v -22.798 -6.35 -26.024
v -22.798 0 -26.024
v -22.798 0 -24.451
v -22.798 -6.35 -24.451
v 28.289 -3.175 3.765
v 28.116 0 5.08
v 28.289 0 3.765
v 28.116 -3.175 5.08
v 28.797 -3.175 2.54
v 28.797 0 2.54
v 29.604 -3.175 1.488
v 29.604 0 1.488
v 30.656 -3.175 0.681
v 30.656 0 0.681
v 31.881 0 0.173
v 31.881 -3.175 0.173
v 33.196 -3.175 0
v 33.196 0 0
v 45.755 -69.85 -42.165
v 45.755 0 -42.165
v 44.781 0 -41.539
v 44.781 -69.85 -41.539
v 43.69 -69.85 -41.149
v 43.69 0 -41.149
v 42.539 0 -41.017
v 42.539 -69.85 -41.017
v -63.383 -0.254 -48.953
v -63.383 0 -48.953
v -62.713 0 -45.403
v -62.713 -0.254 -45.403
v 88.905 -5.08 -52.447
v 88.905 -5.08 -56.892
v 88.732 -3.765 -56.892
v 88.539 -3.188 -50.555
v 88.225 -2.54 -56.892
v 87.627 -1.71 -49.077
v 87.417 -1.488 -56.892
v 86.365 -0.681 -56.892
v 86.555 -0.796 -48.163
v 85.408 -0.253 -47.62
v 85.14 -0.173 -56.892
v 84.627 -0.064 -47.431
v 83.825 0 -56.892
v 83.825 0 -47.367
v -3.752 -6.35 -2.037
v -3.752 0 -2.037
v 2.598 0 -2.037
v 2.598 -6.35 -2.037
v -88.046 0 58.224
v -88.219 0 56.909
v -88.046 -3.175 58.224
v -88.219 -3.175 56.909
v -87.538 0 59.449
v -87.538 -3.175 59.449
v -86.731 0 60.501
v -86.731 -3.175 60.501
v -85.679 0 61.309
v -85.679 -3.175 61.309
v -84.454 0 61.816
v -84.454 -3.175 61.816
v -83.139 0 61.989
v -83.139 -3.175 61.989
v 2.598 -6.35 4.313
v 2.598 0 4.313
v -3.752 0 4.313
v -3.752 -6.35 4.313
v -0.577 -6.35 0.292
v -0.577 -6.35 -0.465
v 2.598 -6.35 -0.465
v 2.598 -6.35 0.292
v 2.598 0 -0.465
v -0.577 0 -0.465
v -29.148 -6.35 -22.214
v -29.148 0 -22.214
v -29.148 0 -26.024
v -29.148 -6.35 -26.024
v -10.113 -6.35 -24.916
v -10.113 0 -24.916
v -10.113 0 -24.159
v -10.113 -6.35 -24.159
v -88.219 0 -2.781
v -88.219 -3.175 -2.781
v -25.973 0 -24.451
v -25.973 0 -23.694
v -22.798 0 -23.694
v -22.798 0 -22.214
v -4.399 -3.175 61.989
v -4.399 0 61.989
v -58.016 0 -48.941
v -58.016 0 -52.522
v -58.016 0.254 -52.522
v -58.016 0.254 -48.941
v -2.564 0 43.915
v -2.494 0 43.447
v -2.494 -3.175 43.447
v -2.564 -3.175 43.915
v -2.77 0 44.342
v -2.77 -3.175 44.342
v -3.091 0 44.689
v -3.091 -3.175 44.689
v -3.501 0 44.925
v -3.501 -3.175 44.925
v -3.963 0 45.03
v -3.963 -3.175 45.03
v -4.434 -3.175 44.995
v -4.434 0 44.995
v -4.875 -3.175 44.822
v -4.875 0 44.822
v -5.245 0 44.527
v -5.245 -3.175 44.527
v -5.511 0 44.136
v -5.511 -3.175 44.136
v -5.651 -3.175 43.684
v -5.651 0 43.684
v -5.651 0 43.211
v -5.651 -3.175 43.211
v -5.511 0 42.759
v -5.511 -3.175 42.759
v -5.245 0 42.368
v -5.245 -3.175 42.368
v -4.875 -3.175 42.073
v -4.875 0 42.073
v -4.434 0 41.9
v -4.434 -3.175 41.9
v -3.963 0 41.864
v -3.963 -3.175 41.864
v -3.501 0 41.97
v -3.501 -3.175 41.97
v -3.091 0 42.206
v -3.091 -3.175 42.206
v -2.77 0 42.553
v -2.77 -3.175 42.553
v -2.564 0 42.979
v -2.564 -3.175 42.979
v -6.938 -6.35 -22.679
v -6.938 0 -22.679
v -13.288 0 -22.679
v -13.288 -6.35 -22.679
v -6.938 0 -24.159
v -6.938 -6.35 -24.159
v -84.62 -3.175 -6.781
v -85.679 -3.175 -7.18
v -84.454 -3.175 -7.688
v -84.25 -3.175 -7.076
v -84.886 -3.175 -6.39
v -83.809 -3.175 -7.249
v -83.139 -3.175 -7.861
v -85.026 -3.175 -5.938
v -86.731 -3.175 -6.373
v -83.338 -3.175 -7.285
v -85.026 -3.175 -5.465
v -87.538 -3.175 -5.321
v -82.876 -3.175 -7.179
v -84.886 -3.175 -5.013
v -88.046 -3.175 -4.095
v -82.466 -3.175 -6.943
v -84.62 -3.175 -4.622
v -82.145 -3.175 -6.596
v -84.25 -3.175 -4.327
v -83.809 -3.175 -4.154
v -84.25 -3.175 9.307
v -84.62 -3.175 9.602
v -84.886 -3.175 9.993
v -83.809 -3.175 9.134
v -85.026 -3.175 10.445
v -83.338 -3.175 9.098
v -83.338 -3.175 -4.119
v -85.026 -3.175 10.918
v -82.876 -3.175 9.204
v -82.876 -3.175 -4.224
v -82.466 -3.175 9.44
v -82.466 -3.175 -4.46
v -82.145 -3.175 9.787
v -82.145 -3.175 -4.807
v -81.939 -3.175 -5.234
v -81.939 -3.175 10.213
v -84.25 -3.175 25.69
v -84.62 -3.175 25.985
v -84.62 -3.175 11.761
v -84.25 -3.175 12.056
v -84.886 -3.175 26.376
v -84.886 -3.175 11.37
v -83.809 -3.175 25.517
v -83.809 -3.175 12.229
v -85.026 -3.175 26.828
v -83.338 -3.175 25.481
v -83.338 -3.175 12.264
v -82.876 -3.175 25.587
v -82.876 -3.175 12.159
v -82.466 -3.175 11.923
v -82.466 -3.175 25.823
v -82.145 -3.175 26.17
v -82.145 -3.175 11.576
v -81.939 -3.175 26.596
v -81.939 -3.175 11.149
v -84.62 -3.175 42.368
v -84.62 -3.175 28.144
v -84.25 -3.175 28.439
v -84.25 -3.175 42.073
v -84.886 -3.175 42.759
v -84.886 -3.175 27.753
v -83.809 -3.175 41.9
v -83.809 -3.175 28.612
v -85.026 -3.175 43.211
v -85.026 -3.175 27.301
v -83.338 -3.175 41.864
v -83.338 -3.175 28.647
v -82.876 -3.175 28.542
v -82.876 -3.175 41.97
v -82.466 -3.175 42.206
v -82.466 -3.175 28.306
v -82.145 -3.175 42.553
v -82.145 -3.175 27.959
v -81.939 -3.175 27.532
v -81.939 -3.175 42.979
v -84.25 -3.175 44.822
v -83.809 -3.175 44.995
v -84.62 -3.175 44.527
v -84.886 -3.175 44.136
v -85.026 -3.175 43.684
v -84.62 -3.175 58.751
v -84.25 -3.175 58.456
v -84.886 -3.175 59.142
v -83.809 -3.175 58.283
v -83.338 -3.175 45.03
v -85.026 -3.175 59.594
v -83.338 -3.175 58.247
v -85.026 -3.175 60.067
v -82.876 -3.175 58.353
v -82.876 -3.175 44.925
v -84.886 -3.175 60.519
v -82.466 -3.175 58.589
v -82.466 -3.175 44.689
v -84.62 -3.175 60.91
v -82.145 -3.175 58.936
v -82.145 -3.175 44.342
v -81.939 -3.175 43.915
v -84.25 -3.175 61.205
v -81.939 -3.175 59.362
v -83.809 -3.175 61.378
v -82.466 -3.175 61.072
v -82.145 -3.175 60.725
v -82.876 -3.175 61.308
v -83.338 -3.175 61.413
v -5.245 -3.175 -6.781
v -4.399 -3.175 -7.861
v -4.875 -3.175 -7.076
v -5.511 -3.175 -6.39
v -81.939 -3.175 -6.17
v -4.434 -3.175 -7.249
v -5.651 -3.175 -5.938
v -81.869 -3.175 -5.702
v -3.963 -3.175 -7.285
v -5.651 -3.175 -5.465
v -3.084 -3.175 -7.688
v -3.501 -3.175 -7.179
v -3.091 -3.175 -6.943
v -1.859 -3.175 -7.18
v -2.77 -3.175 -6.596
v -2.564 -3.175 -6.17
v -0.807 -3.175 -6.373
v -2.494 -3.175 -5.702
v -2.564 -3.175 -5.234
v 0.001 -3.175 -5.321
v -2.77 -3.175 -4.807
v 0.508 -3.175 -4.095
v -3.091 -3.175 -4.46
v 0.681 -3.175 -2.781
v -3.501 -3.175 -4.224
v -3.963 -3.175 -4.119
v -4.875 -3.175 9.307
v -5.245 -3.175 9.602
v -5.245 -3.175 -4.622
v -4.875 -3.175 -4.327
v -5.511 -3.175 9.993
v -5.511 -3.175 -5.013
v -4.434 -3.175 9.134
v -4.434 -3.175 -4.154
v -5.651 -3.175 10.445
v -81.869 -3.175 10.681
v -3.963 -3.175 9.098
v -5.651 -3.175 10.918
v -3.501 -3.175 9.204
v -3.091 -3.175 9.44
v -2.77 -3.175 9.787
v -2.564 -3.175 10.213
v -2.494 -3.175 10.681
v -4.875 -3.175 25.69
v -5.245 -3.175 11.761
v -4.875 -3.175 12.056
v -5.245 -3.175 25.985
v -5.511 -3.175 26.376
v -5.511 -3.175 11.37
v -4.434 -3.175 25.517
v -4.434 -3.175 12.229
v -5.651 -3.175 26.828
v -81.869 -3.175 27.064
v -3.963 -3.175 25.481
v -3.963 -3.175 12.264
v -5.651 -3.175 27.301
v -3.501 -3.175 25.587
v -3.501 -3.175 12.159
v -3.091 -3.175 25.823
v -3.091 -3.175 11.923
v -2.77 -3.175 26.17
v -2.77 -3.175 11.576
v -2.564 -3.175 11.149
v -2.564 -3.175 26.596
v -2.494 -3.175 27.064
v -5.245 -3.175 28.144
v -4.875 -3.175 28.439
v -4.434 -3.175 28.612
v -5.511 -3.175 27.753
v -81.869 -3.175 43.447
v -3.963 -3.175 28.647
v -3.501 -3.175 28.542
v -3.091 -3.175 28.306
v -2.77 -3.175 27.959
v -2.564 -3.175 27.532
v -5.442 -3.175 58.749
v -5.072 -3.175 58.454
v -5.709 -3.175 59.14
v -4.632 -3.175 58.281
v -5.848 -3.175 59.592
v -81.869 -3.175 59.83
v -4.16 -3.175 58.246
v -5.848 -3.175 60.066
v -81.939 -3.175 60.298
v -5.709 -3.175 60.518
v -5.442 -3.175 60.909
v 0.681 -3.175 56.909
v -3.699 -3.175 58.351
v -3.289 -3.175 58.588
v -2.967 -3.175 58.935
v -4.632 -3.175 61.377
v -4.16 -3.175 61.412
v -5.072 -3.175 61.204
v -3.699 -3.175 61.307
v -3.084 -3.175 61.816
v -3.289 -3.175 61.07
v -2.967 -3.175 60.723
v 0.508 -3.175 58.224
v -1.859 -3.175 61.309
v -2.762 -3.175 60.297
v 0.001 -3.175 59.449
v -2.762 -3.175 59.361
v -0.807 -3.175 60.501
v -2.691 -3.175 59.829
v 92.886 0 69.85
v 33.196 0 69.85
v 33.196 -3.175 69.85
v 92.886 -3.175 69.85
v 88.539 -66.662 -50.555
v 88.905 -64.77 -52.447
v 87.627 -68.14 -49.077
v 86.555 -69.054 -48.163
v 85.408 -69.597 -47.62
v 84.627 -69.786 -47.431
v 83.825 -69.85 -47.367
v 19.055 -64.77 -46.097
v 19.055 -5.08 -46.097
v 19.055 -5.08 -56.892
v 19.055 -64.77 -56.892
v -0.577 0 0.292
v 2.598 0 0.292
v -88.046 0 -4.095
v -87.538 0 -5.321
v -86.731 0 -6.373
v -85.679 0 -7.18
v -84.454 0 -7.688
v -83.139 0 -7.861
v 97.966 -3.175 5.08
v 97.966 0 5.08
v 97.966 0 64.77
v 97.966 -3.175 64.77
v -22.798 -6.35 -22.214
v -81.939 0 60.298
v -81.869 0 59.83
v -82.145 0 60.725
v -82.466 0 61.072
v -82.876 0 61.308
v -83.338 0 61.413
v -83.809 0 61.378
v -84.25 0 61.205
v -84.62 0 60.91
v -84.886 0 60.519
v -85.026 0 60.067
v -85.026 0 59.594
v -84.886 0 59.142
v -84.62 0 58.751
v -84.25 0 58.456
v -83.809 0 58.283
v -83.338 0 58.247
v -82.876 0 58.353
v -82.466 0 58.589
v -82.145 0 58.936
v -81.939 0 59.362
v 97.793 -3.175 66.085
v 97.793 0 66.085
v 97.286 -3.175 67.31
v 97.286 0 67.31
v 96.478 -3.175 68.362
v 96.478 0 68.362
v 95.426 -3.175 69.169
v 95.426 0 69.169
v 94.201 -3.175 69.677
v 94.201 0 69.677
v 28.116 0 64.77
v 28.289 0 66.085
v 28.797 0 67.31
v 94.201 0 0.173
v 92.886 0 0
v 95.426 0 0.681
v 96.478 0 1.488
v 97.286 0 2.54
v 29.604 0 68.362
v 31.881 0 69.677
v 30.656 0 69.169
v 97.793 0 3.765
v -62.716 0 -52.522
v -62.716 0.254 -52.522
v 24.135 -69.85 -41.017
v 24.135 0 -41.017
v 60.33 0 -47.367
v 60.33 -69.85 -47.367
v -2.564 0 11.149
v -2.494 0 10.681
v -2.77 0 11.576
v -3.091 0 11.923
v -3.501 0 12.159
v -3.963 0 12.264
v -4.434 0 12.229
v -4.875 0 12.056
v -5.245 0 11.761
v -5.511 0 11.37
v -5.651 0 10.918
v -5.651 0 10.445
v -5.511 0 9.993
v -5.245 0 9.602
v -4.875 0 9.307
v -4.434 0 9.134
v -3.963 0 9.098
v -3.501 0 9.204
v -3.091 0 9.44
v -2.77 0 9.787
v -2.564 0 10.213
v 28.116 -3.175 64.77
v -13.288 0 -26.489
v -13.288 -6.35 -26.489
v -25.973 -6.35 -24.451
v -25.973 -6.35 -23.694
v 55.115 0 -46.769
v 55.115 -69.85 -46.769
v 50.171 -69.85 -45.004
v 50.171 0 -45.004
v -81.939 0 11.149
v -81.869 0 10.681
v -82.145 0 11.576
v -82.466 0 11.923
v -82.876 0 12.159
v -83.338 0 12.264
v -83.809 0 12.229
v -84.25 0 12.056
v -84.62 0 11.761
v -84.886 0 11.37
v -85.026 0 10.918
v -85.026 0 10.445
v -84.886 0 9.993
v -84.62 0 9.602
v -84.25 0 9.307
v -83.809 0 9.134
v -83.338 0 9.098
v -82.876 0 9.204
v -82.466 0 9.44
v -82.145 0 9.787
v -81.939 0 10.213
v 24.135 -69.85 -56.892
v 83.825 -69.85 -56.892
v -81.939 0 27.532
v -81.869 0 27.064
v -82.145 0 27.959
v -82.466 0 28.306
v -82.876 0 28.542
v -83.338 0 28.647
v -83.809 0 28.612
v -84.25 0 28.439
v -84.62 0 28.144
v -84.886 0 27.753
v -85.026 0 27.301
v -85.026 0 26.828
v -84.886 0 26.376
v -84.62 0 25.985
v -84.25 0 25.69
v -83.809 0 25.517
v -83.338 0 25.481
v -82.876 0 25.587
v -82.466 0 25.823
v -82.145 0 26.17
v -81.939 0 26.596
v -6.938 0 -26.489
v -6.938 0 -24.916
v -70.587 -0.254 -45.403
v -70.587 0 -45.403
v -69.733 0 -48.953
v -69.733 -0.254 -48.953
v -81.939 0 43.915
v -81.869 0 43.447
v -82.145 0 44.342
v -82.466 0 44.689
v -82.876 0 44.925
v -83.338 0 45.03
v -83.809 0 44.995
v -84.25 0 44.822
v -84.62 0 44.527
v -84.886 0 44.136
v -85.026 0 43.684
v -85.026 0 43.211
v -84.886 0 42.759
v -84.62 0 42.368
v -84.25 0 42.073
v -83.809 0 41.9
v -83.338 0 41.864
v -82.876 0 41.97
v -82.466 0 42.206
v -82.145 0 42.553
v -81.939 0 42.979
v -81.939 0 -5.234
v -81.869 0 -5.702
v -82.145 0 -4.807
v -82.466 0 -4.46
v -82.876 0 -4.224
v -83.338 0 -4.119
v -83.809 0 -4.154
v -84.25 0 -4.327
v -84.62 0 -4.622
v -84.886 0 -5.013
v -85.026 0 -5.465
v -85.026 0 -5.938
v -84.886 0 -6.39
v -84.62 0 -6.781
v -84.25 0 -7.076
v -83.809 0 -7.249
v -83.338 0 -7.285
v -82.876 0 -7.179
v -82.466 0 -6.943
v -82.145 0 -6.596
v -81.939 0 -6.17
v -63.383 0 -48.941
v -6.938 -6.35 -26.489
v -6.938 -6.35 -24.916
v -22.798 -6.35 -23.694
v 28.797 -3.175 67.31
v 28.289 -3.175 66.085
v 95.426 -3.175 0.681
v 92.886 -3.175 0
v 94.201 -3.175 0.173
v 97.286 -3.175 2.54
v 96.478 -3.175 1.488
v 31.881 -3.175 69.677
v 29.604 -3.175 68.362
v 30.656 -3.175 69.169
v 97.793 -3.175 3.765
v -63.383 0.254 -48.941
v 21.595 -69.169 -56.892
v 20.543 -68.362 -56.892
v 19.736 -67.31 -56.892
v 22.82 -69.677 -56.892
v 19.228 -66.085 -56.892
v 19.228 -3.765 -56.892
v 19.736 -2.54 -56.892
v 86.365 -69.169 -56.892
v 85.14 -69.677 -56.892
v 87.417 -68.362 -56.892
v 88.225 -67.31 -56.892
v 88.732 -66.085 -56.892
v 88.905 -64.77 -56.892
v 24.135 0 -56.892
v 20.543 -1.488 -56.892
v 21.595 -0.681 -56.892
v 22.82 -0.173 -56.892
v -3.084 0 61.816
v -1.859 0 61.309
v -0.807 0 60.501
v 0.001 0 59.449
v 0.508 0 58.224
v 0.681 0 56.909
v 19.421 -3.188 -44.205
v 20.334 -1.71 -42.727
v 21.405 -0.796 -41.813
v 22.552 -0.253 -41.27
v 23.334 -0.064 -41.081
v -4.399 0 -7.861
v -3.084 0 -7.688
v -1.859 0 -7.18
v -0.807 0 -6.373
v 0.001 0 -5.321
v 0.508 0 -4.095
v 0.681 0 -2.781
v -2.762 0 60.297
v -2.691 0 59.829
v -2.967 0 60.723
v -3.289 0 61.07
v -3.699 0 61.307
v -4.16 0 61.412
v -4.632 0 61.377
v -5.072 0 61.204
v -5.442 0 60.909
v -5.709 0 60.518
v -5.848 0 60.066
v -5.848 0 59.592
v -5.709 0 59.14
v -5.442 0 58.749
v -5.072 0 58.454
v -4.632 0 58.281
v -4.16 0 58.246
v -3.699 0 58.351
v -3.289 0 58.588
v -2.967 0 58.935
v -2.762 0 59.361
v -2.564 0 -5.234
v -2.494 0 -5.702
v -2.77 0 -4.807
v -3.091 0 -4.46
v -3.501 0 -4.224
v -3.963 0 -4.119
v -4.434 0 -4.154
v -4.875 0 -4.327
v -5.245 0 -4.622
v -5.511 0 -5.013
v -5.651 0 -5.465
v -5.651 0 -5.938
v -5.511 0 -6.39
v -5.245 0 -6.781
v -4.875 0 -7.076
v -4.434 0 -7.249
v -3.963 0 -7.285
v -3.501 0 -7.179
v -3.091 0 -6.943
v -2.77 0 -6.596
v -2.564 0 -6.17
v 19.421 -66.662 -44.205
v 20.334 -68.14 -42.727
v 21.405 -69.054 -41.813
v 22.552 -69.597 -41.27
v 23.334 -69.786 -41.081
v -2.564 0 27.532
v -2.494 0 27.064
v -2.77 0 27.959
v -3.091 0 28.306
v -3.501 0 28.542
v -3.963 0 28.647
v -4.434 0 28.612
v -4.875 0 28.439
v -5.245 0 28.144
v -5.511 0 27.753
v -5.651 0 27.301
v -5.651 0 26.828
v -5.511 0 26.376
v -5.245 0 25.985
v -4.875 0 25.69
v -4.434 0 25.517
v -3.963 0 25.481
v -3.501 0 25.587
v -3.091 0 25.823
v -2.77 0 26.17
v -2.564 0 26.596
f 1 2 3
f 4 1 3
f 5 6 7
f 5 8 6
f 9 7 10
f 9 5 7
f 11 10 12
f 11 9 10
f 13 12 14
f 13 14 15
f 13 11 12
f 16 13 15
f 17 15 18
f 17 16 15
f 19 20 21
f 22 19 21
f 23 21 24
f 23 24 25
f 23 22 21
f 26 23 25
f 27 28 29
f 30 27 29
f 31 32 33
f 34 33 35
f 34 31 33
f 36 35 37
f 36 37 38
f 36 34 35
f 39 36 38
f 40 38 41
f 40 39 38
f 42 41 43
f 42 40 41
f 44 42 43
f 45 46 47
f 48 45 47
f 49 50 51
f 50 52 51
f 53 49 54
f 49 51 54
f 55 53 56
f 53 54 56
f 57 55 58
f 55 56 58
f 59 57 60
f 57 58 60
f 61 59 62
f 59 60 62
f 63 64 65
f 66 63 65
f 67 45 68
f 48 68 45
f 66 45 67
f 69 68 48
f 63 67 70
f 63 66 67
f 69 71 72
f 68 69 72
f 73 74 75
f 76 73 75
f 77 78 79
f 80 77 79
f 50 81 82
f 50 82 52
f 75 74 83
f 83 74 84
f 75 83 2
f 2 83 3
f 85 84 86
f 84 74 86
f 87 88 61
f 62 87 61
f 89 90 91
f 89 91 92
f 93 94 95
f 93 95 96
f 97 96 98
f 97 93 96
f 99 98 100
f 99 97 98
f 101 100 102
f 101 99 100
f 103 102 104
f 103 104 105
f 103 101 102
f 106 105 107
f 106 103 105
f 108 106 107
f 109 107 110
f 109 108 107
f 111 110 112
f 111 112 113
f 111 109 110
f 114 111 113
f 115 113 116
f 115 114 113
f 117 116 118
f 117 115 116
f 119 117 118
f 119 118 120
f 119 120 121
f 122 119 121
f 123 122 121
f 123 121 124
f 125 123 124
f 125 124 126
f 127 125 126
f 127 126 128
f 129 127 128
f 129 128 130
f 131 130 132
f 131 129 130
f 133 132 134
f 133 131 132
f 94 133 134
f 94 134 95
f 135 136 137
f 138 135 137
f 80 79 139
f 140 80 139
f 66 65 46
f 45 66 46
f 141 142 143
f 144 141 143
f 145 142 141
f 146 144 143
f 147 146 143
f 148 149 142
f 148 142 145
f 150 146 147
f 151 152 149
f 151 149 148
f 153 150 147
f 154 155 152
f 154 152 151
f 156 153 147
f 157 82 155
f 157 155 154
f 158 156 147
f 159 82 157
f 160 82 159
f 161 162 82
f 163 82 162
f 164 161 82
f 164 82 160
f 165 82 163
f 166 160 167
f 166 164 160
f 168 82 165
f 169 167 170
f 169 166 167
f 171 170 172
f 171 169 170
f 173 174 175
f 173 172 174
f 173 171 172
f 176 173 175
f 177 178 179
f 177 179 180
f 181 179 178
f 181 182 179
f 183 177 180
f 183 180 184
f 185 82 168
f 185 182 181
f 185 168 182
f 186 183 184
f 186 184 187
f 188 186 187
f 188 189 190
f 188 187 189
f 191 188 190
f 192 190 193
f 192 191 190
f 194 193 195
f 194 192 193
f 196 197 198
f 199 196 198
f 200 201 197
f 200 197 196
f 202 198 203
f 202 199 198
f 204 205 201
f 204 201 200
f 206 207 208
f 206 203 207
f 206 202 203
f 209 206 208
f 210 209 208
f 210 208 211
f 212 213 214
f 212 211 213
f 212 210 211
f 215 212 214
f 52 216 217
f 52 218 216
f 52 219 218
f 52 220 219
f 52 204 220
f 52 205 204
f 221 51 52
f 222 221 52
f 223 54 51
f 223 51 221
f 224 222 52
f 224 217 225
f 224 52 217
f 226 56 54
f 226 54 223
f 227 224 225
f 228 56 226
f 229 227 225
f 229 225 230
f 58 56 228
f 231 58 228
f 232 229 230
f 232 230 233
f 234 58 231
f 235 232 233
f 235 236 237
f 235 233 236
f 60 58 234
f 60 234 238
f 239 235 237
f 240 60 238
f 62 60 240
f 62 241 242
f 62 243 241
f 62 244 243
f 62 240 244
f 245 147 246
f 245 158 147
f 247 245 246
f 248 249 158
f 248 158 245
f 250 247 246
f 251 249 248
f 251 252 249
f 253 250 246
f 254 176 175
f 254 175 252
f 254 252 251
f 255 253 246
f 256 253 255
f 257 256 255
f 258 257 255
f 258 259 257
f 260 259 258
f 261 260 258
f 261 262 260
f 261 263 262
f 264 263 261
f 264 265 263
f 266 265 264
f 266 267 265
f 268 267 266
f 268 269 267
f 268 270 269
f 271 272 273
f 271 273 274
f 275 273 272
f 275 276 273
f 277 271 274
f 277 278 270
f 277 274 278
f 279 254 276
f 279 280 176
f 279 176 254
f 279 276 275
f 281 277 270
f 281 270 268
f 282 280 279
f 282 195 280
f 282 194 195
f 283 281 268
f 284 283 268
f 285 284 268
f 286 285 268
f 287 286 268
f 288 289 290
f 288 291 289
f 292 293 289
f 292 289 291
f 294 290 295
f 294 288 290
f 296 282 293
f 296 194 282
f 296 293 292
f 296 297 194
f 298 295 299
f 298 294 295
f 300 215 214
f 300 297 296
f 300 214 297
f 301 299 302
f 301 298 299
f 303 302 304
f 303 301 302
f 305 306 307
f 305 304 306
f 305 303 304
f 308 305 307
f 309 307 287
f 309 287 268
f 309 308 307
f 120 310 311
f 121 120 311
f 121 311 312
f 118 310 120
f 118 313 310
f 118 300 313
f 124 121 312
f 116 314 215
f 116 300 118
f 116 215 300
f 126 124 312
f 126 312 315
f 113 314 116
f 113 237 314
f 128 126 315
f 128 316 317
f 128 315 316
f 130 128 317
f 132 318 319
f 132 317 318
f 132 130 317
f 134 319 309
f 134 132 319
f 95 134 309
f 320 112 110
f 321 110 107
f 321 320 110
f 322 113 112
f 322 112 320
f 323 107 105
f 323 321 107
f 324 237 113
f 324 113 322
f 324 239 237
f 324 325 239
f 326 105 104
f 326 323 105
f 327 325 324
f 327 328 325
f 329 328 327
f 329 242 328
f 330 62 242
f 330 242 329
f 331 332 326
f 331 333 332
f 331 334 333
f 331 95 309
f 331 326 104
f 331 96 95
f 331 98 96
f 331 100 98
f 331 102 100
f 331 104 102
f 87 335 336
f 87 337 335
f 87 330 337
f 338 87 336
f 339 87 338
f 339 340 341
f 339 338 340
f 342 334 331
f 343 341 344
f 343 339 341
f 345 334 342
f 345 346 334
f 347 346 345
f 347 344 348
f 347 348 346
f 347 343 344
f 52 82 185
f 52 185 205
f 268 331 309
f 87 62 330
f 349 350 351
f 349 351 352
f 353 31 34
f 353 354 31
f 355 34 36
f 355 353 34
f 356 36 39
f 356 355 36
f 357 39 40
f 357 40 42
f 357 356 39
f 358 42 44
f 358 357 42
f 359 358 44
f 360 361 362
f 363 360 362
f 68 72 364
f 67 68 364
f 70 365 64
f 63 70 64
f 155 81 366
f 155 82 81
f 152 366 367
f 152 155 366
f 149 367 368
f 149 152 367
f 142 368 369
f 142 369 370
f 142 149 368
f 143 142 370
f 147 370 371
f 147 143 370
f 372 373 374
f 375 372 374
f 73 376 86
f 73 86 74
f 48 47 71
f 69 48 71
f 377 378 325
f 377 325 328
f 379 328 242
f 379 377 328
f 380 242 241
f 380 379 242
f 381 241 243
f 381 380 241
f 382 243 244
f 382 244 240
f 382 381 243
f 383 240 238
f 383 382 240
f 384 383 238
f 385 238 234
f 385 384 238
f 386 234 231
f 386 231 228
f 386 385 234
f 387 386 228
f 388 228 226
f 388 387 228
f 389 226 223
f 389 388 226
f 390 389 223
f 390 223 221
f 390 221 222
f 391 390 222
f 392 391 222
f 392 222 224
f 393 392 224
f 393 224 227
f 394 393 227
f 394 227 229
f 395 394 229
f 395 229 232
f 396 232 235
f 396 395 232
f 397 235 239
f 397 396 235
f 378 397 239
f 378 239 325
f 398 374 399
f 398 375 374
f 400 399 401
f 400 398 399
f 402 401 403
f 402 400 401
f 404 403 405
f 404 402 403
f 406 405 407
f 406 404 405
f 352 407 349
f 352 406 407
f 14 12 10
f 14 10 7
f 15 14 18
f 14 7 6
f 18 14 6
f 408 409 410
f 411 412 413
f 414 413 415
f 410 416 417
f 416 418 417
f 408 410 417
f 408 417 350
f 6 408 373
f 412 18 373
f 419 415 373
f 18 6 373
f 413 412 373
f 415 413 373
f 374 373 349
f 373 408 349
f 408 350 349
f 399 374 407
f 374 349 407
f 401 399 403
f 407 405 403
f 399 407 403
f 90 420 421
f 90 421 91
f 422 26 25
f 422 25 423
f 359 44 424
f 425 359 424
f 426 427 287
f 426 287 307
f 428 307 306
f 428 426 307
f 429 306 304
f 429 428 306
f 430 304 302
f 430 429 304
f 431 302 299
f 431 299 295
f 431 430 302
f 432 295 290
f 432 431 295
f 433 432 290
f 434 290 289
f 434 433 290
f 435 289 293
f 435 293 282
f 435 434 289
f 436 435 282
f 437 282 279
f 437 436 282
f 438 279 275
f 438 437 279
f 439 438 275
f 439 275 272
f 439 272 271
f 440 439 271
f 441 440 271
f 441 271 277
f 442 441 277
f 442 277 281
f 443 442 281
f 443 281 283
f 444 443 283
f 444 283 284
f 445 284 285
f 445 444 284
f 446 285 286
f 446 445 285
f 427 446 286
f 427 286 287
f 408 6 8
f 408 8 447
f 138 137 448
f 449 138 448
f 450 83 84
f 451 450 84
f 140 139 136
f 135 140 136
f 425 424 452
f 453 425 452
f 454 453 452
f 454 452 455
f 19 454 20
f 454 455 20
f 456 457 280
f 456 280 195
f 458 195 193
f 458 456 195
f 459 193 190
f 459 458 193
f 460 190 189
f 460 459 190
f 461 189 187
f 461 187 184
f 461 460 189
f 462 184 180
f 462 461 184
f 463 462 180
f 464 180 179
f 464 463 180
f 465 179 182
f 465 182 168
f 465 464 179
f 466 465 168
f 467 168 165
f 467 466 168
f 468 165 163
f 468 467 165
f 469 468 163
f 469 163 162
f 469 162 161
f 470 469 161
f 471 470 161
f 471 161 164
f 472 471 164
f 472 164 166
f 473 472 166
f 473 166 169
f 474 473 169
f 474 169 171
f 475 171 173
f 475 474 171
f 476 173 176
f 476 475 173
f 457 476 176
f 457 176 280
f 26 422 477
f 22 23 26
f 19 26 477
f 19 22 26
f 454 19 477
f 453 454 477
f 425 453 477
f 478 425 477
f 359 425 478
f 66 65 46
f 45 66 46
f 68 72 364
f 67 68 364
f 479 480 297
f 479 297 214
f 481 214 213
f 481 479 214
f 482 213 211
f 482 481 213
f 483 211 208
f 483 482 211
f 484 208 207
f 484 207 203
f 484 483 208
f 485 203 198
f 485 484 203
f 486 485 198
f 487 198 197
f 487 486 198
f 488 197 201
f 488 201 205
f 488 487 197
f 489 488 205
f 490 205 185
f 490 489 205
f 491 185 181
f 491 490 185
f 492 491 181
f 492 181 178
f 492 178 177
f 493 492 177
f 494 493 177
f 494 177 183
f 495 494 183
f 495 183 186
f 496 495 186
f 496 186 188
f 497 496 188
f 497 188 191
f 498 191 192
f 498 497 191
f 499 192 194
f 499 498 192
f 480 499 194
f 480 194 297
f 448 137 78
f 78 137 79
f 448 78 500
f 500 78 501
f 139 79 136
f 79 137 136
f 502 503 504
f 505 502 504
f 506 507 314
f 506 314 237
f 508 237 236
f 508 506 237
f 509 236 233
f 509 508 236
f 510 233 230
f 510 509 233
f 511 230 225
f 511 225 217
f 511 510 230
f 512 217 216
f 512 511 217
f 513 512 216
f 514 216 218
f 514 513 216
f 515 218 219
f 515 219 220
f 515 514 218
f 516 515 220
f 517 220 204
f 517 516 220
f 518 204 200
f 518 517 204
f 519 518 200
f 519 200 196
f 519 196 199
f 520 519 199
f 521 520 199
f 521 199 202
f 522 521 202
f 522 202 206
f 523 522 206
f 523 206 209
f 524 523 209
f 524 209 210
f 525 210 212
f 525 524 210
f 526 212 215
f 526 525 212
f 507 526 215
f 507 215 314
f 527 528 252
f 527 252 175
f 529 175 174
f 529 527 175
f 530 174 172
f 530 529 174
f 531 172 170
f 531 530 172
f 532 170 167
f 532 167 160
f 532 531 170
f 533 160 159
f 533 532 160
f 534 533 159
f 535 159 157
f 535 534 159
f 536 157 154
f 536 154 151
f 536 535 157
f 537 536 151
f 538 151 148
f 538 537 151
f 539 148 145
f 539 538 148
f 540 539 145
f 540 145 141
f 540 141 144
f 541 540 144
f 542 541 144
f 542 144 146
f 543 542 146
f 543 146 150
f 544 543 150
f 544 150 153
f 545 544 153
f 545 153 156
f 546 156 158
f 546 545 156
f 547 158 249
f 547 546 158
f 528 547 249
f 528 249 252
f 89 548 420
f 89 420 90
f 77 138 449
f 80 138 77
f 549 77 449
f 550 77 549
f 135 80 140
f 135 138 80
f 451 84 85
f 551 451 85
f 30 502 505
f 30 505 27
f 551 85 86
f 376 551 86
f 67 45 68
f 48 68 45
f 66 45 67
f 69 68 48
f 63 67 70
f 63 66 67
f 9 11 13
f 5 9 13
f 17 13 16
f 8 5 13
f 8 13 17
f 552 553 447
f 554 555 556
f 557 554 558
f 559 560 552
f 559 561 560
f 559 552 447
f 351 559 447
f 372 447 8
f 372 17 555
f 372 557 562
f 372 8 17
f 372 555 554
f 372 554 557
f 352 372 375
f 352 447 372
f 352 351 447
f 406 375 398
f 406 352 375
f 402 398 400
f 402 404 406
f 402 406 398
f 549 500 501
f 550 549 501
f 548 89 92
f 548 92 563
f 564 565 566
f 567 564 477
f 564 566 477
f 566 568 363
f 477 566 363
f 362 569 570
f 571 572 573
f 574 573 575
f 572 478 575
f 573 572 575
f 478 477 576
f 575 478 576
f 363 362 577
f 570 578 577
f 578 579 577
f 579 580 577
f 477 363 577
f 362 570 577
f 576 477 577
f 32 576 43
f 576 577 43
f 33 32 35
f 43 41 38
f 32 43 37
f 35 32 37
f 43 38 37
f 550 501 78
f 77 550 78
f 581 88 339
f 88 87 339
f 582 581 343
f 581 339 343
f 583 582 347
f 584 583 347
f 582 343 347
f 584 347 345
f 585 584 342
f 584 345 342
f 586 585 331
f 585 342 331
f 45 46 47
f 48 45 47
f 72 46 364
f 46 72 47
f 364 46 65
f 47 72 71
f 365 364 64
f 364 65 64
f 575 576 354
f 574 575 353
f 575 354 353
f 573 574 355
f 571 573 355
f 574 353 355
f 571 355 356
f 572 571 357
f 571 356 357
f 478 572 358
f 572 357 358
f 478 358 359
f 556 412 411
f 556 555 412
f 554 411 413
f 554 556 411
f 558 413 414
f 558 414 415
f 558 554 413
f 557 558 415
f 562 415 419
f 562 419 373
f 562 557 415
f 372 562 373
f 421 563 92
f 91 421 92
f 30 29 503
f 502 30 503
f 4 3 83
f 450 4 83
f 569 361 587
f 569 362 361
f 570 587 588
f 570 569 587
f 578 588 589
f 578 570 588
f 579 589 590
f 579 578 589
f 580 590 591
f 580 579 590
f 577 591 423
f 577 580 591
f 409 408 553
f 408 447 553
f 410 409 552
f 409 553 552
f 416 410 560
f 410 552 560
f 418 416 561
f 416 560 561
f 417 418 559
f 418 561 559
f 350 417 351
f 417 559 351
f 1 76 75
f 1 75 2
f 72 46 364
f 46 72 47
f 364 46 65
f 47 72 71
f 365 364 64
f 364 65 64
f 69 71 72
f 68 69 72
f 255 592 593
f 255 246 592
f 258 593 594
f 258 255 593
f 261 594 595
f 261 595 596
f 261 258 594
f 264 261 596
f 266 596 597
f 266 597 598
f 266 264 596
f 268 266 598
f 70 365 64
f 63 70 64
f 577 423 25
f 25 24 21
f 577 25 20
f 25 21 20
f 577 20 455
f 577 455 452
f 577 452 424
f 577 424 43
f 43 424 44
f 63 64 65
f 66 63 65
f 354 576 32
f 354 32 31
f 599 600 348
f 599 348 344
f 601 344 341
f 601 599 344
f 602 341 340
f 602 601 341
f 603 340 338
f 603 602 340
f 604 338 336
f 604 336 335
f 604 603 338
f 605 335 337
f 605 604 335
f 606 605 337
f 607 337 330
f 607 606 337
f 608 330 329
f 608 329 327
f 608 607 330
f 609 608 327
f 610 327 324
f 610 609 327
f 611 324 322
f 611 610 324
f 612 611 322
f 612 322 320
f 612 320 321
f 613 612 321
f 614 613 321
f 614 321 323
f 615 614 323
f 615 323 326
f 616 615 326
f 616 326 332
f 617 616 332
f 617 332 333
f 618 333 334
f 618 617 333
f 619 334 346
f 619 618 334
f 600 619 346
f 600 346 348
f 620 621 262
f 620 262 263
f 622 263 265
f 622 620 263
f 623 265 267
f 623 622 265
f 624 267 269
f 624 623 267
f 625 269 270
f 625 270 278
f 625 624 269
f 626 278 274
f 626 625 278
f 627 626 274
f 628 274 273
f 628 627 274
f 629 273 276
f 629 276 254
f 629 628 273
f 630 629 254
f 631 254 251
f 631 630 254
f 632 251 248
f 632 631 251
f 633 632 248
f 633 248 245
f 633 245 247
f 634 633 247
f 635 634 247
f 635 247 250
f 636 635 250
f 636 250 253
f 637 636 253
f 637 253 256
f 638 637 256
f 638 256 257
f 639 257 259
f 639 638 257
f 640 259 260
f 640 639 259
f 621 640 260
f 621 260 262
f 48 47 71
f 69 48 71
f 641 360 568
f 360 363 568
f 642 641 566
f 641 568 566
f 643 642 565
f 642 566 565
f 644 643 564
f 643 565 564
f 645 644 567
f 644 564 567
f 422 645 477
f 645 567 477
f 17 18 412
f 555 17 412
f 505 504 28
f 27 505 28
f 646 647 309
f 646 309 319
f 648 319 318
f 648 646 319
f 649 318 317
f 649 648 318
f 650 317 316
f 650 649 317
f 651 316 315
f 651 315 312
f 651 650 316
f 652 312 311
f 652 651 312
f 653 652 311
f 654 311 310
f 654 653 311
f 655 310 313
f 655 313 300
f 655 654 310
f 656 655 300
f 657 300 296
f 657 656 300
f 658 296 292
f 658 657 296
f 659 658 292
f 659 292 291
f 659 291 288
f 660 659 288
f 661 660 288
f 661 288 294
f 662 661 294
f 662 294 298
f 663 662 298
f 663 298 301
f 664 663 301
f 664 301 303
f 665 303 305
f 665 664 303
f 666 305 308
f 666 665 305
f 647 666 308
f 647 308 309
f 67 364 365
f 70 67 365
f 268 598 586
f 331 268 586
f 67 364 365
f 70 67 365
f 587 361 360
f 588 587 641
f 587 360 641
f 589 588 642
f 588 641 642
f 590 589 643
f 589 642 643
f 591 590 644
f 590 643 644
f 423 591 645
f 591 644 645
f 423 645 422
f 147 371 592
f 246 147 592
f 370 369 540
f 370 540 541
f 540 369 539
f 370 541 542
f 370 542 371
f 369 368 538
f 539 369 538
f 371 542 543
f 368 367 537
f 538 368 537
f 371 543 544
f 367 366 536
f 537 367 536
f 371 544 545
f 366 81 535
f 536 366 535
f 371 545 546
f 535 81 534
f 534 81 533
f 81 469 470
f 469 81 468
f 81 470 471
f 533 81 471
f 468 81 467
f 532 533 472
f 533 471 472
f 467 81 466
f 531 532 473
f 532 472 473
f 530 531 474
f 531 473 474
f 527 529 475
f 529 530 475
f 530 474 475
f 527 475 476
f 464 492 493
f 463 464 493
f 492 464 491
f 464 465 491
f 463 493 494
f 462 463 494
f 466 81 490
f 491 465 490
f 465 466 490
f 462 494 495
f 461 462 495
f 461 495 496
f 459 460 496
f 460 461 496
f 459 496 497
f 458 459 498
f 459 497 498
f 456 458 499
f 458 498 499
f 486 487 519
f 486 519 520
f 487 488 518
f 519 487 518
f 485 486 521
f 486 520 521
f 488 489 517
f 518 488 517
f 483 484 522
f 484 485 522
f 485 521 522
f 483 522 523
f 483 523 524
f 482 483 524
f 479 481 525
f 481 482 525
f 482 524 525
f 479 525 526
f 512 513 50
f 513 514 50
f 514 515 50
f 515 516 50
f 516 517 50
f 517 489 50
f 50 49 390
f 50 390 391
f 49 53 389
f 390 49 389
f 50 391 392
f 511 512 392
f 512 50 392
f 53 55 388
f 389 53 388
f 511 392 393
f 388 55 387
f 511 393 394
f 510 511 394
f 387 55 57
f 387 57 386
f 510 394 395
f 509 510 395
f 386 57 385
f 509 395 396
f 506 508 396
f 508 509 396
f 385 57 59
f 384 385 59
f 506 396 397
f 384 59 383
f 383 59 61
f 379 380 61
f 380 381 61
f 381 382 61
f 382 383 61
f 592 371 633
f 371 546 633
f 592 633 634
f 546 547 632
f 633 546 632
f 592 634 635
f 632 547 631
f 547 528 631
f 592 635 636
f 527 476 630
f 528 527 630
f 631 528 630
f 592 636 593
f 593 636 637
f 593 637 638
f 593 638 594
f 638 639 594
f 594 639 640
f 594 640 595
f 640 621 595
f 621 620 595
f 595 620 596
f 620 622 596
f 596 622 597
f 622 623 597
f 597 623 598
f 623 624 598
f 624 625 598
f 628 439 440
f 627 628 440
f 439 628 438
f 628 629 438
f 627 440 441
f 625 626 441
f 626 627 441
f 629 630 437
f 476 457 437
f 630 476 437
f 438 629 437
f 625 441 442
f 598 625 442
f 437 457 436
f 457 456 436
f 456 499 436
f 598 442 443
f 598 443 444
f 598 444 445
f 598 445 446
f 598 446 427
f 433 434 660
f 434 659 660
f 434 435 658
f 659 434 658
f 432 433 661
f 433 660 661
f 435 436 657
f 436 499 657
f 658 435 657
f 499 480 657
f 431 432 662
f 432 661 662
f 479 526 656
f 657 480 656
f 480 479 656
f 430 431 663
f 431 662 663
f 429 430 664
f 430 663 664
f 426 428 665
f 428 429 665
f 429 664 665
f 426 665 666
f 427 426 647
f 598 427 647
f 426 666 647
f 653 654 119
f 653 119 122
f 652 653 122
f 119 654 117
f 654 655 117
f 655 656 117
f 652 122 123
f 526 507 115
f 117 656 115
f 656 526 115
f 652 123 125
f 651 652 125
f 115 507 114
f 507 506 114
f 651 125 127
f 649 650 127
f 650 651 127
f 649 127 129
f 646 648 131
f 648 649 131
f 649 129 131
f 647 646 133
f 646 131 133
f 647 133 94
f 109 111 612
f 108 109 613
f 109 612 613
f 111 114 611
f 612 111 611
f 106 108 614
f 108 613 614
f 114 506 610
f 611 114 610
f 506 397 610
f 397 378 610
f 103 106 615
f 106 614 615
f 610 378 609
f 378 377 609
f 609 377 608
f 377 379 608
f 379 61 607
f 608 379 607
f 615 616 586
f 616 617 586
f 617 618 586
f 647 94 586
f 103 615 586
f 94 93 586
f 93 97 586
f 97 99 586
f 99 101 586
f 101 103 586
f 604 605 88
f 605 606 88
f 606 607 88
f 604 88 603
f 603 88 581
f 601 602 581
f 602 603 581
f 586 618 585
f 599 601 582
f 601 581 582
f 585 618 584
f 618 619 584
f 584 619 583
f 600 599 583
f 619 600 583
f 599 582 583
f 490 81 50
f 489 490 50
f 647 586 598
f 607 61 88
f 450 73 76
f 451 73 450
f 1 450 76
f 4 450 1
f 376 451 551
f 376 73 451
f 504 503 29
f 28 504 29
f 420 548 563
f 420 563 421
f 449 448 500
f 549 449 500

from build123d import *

# Parameters (mm, degrees)
F0_W      = 9.525
F0_H      = 69.85
F0_R      = 1.5875
F0_W_2    = 69.85
F1_DEPTH  = 3.175
F2_R      = 5.08
F3_W      = 69.85
F3_H      = 69.85
F4_DEPTH  = 3.175
F5_R      = 5.08
F7_DEPTH  = 69.85
F8_R      = 5.08
F10_DEPTH = 0.254
F12_DEPTH = 0.254
F14_DEPTH = 6.35
F16_DEPTH = 6.35


with BuildPart() as f1:
    # F0 (on Front) → F1 (new body)
    with BuildSketch(Plane.XZ):
        with Locations((-83.4562088089, 27.0643814001)):
            Rectangle(F0_W, F0_H)
        with Locations((-83.4562088089, -5.7016185999)):
            Circle(F0_R, mode=Mode.SUBTRACT)
        with Locations((-83.4562088089, 10.6813814001)):
            Circle(F0_R, mode=Mode.SUBTRACT)
        with Locations((-83.4562088089, 27.0643814001)):
            Circle(F0_R, mode=Mode.SUBTRACT)
        with Locations((-83.4562088089, 43.4473814001)):
            Circle(F0_R, mode=Mode.SUBTRACT)
        with Locations((-83.4562088089, 59.8303814001)):
            Circle(F0_R, mode=Mode.SUBTRACT)
        with Locations((-43.7687088089, 27.0643814001)):
            Rectangle(F0_W_2, F0_H)
        with Locations((-4.0812088089, 27.0643814001)):
            Rectangle(F0_W, F0_H)
        with Locations((-4.0812088089, -5.7016185999)):
            Circle(F0_R, mode=Mode.SUBTRACT)
        with Locations((-4.0812088089, 10.6813814001)):
            Circle(F0_R, mode=Mode.SUBTRACT)
        with Locations((-4.0812088089, 27.0643814001)):
            Circle(F0_R, mode=Mode.SUBTRACT)
        with Locations((-4.0812088089, 43.4473814001)):
            Circle(F0_R, mode=Mode.SUBTRACT)
        with Locations((-4.2786324712, 59.8289058444)):
            Circle(F0_R, mode=Mode.SUBTRACT)
    extrude(amount=F1_DEPTH)

    # F2
    f2_edges = [f1.edges().sort_by_distance(p)[0] for p in [
        (-88.218709, -1.5875, -7.860619),
        (0.681291, -1.5875, -7.860619),
        (0.681291, -1.5875, 61.989381),
        (-88.218709, -1.5875, 61.989381),
    ]]
    fillet(f2_edges, radius=F2_R)


with BuildPart() as f4:
    # F3 (on Front) → F4 (new body)
    with BuildSketch(Plane.XZ):
        with Locations((63.0412368688, 34.925)):
            Rectangle(F3_W, F3_H)
    extrude(amount=F4_DEPTH)

    # F5
    f5_edges = [f4.edges().sort_by_distance(p)[0] for p in [
        (28.116237, -1.5875, 69.85),
        (28.116237, -1.5875, 0),
        (97.966237, -1.5875, 0),
        (97.966237, -1.5875, 69.85),
    ]]
    fillet(f5_edges, radius=F5_R)


with BuildPart() as f7:
    # F6 (on Front) → F7 (new body)
    with BuildSketch(Plane.XZ):
        with BuildLine():
            Line((19.0550971746, -41.0171044469), (19.0550971746, -56.8921044469))
            Line((19.0550971746, -56.8921044469), (88.9050971746, -56.8921044469))
            Line((88.9050971746, -56.8921044469), (88.9050971746, -47.3671044469))
            Line((88.9050971746, -47.3671044469), (60.3300971746, -47.3671044469))
            ThreePointArc((60.3300971746, -47.3671044469), (51.7811480433, -45.7207272752), (44.4550971746, -41.0171044469))
            Line((44.4550971746, -41.0171044469), (19.0550971746, -41.0171044469))
        make_face()
    extrude(amount=F7_DEPTH)

    # F8
    f8_edges = [f7.edges().sort_by_distance(p)[0] for p in [
        (19.055097, -34.925, -41.017104),
        (44.455097, -34.925, -41.017104),
        (88.905097, -34.925, -47.367104),
        (88.905097, 0, -52.129604),
        (19.055097, 0, -48.954604),
        (19.055097, -69.85, -48.954604),
        (88.905097, -69.85, -52.129604),
    ]]
    fillet(f8_edges, radius=F8_R)


with BuildPart() as f10:
    # F9 (on Front) → F10 (new body)
    with BuildSketch(Plane.XZ):
        Polygon((-70.5872430673, -45.403085649), (-69.733457911, -48.9525124431), (-63.383457911, -48.9525124431), (-62.7132430673, -45.403085649), align=None)
    extrude(amount=F10_DEPTH)


with BuildPart() as f12:
    # F11 (on Front) → F12 (new body)
    with BuildSketch(Plane.XZ):
        Polygon((-58.0156743526, -48.9407926798), (-63.3826851845, -48.9407926798), (-62.7155974507, -52.5220185518), (-58.0156743526, -52.5220185518), align=None)
    extrude(amount=-F12_DEPTH)


with BuildPart() as f14:
    # F13 (on Front) → F14 (new body)
    with BuildSketch(Plane.XZ):
        Polygon((-22.7977062657, -22.2139001109), (-29.1477062657, -22.2139001109), (-29.1477062657, -26.0239001109), (-22.7977062657, -26.0239001109), (-22.7977062657, -24.4512986392), (-25.9727062657, -24.4512986392), (-25.9727062657, -23.6941799521), (-22.7977062657, -23.6941799521), align=None)
    extrude(amount=F14_DEPTH)


with BuildPart() as f14b:
    # F13 (on Front) → F14, piece 2 (new body)
    with BuildSketch(Plane.XZ):
        Polygon((2.5977272727, 4.3127597036), (-3.7522727273, 4.3127597036), (-3.7522727273, -2.0372402964), (2.5977272727, -2.0372402964), (2.5977272727, -0.4646388247), (-0.5772727273, -0.4646388247), (-0.5772727273, 0.2924798623), (2.5977272727, 0.2924798623), align=None)
    extrude(amount=F14_DEPTH)


with BuildPart() as f16:
    # F15 (on Front) → F16 (new body)
    with BuildSketch(Plane.XZ):
        Polygon((2.5977272727, 4.3127597036), (-3.7522727273, 4.3127597036), (-3.7522727273, -2.0372402964), (2.5977272727, -2.0372402964), (2.5977272727, -0.4646388247), (-0.5772727273, -0.4646388247), (-0.5772727273, 0.2924798623), (2.5977272727, 0.2924798623), align=None)
    extrude(amount=F16_DEPTH)


with BuildPart() as f16b:
    # F15 (on Front) → F16, piece 2 (new body)
    with BuildSketch(Plane.XZ):
        Polygon((-6.9376189075, -22.6785389356), (-13.2876189075, -22.6785389356), (-13.2876189075, -26.4885389356), (-6.9376189075, -26.4885389356), (-6.9376189075, -24.9159374639), (-10.1126189075, -24.9159374639), (-10.1126189075, -24.1588187769), (-6.9376189075, -24.1588187769), align=None)
    extrude(amount=F16_DEPTH)


solid = Compound([f1.part, f4.part, f7.part, f10.part, f12.part, f14.part, f14b.part, f16.part, f16b.part])
